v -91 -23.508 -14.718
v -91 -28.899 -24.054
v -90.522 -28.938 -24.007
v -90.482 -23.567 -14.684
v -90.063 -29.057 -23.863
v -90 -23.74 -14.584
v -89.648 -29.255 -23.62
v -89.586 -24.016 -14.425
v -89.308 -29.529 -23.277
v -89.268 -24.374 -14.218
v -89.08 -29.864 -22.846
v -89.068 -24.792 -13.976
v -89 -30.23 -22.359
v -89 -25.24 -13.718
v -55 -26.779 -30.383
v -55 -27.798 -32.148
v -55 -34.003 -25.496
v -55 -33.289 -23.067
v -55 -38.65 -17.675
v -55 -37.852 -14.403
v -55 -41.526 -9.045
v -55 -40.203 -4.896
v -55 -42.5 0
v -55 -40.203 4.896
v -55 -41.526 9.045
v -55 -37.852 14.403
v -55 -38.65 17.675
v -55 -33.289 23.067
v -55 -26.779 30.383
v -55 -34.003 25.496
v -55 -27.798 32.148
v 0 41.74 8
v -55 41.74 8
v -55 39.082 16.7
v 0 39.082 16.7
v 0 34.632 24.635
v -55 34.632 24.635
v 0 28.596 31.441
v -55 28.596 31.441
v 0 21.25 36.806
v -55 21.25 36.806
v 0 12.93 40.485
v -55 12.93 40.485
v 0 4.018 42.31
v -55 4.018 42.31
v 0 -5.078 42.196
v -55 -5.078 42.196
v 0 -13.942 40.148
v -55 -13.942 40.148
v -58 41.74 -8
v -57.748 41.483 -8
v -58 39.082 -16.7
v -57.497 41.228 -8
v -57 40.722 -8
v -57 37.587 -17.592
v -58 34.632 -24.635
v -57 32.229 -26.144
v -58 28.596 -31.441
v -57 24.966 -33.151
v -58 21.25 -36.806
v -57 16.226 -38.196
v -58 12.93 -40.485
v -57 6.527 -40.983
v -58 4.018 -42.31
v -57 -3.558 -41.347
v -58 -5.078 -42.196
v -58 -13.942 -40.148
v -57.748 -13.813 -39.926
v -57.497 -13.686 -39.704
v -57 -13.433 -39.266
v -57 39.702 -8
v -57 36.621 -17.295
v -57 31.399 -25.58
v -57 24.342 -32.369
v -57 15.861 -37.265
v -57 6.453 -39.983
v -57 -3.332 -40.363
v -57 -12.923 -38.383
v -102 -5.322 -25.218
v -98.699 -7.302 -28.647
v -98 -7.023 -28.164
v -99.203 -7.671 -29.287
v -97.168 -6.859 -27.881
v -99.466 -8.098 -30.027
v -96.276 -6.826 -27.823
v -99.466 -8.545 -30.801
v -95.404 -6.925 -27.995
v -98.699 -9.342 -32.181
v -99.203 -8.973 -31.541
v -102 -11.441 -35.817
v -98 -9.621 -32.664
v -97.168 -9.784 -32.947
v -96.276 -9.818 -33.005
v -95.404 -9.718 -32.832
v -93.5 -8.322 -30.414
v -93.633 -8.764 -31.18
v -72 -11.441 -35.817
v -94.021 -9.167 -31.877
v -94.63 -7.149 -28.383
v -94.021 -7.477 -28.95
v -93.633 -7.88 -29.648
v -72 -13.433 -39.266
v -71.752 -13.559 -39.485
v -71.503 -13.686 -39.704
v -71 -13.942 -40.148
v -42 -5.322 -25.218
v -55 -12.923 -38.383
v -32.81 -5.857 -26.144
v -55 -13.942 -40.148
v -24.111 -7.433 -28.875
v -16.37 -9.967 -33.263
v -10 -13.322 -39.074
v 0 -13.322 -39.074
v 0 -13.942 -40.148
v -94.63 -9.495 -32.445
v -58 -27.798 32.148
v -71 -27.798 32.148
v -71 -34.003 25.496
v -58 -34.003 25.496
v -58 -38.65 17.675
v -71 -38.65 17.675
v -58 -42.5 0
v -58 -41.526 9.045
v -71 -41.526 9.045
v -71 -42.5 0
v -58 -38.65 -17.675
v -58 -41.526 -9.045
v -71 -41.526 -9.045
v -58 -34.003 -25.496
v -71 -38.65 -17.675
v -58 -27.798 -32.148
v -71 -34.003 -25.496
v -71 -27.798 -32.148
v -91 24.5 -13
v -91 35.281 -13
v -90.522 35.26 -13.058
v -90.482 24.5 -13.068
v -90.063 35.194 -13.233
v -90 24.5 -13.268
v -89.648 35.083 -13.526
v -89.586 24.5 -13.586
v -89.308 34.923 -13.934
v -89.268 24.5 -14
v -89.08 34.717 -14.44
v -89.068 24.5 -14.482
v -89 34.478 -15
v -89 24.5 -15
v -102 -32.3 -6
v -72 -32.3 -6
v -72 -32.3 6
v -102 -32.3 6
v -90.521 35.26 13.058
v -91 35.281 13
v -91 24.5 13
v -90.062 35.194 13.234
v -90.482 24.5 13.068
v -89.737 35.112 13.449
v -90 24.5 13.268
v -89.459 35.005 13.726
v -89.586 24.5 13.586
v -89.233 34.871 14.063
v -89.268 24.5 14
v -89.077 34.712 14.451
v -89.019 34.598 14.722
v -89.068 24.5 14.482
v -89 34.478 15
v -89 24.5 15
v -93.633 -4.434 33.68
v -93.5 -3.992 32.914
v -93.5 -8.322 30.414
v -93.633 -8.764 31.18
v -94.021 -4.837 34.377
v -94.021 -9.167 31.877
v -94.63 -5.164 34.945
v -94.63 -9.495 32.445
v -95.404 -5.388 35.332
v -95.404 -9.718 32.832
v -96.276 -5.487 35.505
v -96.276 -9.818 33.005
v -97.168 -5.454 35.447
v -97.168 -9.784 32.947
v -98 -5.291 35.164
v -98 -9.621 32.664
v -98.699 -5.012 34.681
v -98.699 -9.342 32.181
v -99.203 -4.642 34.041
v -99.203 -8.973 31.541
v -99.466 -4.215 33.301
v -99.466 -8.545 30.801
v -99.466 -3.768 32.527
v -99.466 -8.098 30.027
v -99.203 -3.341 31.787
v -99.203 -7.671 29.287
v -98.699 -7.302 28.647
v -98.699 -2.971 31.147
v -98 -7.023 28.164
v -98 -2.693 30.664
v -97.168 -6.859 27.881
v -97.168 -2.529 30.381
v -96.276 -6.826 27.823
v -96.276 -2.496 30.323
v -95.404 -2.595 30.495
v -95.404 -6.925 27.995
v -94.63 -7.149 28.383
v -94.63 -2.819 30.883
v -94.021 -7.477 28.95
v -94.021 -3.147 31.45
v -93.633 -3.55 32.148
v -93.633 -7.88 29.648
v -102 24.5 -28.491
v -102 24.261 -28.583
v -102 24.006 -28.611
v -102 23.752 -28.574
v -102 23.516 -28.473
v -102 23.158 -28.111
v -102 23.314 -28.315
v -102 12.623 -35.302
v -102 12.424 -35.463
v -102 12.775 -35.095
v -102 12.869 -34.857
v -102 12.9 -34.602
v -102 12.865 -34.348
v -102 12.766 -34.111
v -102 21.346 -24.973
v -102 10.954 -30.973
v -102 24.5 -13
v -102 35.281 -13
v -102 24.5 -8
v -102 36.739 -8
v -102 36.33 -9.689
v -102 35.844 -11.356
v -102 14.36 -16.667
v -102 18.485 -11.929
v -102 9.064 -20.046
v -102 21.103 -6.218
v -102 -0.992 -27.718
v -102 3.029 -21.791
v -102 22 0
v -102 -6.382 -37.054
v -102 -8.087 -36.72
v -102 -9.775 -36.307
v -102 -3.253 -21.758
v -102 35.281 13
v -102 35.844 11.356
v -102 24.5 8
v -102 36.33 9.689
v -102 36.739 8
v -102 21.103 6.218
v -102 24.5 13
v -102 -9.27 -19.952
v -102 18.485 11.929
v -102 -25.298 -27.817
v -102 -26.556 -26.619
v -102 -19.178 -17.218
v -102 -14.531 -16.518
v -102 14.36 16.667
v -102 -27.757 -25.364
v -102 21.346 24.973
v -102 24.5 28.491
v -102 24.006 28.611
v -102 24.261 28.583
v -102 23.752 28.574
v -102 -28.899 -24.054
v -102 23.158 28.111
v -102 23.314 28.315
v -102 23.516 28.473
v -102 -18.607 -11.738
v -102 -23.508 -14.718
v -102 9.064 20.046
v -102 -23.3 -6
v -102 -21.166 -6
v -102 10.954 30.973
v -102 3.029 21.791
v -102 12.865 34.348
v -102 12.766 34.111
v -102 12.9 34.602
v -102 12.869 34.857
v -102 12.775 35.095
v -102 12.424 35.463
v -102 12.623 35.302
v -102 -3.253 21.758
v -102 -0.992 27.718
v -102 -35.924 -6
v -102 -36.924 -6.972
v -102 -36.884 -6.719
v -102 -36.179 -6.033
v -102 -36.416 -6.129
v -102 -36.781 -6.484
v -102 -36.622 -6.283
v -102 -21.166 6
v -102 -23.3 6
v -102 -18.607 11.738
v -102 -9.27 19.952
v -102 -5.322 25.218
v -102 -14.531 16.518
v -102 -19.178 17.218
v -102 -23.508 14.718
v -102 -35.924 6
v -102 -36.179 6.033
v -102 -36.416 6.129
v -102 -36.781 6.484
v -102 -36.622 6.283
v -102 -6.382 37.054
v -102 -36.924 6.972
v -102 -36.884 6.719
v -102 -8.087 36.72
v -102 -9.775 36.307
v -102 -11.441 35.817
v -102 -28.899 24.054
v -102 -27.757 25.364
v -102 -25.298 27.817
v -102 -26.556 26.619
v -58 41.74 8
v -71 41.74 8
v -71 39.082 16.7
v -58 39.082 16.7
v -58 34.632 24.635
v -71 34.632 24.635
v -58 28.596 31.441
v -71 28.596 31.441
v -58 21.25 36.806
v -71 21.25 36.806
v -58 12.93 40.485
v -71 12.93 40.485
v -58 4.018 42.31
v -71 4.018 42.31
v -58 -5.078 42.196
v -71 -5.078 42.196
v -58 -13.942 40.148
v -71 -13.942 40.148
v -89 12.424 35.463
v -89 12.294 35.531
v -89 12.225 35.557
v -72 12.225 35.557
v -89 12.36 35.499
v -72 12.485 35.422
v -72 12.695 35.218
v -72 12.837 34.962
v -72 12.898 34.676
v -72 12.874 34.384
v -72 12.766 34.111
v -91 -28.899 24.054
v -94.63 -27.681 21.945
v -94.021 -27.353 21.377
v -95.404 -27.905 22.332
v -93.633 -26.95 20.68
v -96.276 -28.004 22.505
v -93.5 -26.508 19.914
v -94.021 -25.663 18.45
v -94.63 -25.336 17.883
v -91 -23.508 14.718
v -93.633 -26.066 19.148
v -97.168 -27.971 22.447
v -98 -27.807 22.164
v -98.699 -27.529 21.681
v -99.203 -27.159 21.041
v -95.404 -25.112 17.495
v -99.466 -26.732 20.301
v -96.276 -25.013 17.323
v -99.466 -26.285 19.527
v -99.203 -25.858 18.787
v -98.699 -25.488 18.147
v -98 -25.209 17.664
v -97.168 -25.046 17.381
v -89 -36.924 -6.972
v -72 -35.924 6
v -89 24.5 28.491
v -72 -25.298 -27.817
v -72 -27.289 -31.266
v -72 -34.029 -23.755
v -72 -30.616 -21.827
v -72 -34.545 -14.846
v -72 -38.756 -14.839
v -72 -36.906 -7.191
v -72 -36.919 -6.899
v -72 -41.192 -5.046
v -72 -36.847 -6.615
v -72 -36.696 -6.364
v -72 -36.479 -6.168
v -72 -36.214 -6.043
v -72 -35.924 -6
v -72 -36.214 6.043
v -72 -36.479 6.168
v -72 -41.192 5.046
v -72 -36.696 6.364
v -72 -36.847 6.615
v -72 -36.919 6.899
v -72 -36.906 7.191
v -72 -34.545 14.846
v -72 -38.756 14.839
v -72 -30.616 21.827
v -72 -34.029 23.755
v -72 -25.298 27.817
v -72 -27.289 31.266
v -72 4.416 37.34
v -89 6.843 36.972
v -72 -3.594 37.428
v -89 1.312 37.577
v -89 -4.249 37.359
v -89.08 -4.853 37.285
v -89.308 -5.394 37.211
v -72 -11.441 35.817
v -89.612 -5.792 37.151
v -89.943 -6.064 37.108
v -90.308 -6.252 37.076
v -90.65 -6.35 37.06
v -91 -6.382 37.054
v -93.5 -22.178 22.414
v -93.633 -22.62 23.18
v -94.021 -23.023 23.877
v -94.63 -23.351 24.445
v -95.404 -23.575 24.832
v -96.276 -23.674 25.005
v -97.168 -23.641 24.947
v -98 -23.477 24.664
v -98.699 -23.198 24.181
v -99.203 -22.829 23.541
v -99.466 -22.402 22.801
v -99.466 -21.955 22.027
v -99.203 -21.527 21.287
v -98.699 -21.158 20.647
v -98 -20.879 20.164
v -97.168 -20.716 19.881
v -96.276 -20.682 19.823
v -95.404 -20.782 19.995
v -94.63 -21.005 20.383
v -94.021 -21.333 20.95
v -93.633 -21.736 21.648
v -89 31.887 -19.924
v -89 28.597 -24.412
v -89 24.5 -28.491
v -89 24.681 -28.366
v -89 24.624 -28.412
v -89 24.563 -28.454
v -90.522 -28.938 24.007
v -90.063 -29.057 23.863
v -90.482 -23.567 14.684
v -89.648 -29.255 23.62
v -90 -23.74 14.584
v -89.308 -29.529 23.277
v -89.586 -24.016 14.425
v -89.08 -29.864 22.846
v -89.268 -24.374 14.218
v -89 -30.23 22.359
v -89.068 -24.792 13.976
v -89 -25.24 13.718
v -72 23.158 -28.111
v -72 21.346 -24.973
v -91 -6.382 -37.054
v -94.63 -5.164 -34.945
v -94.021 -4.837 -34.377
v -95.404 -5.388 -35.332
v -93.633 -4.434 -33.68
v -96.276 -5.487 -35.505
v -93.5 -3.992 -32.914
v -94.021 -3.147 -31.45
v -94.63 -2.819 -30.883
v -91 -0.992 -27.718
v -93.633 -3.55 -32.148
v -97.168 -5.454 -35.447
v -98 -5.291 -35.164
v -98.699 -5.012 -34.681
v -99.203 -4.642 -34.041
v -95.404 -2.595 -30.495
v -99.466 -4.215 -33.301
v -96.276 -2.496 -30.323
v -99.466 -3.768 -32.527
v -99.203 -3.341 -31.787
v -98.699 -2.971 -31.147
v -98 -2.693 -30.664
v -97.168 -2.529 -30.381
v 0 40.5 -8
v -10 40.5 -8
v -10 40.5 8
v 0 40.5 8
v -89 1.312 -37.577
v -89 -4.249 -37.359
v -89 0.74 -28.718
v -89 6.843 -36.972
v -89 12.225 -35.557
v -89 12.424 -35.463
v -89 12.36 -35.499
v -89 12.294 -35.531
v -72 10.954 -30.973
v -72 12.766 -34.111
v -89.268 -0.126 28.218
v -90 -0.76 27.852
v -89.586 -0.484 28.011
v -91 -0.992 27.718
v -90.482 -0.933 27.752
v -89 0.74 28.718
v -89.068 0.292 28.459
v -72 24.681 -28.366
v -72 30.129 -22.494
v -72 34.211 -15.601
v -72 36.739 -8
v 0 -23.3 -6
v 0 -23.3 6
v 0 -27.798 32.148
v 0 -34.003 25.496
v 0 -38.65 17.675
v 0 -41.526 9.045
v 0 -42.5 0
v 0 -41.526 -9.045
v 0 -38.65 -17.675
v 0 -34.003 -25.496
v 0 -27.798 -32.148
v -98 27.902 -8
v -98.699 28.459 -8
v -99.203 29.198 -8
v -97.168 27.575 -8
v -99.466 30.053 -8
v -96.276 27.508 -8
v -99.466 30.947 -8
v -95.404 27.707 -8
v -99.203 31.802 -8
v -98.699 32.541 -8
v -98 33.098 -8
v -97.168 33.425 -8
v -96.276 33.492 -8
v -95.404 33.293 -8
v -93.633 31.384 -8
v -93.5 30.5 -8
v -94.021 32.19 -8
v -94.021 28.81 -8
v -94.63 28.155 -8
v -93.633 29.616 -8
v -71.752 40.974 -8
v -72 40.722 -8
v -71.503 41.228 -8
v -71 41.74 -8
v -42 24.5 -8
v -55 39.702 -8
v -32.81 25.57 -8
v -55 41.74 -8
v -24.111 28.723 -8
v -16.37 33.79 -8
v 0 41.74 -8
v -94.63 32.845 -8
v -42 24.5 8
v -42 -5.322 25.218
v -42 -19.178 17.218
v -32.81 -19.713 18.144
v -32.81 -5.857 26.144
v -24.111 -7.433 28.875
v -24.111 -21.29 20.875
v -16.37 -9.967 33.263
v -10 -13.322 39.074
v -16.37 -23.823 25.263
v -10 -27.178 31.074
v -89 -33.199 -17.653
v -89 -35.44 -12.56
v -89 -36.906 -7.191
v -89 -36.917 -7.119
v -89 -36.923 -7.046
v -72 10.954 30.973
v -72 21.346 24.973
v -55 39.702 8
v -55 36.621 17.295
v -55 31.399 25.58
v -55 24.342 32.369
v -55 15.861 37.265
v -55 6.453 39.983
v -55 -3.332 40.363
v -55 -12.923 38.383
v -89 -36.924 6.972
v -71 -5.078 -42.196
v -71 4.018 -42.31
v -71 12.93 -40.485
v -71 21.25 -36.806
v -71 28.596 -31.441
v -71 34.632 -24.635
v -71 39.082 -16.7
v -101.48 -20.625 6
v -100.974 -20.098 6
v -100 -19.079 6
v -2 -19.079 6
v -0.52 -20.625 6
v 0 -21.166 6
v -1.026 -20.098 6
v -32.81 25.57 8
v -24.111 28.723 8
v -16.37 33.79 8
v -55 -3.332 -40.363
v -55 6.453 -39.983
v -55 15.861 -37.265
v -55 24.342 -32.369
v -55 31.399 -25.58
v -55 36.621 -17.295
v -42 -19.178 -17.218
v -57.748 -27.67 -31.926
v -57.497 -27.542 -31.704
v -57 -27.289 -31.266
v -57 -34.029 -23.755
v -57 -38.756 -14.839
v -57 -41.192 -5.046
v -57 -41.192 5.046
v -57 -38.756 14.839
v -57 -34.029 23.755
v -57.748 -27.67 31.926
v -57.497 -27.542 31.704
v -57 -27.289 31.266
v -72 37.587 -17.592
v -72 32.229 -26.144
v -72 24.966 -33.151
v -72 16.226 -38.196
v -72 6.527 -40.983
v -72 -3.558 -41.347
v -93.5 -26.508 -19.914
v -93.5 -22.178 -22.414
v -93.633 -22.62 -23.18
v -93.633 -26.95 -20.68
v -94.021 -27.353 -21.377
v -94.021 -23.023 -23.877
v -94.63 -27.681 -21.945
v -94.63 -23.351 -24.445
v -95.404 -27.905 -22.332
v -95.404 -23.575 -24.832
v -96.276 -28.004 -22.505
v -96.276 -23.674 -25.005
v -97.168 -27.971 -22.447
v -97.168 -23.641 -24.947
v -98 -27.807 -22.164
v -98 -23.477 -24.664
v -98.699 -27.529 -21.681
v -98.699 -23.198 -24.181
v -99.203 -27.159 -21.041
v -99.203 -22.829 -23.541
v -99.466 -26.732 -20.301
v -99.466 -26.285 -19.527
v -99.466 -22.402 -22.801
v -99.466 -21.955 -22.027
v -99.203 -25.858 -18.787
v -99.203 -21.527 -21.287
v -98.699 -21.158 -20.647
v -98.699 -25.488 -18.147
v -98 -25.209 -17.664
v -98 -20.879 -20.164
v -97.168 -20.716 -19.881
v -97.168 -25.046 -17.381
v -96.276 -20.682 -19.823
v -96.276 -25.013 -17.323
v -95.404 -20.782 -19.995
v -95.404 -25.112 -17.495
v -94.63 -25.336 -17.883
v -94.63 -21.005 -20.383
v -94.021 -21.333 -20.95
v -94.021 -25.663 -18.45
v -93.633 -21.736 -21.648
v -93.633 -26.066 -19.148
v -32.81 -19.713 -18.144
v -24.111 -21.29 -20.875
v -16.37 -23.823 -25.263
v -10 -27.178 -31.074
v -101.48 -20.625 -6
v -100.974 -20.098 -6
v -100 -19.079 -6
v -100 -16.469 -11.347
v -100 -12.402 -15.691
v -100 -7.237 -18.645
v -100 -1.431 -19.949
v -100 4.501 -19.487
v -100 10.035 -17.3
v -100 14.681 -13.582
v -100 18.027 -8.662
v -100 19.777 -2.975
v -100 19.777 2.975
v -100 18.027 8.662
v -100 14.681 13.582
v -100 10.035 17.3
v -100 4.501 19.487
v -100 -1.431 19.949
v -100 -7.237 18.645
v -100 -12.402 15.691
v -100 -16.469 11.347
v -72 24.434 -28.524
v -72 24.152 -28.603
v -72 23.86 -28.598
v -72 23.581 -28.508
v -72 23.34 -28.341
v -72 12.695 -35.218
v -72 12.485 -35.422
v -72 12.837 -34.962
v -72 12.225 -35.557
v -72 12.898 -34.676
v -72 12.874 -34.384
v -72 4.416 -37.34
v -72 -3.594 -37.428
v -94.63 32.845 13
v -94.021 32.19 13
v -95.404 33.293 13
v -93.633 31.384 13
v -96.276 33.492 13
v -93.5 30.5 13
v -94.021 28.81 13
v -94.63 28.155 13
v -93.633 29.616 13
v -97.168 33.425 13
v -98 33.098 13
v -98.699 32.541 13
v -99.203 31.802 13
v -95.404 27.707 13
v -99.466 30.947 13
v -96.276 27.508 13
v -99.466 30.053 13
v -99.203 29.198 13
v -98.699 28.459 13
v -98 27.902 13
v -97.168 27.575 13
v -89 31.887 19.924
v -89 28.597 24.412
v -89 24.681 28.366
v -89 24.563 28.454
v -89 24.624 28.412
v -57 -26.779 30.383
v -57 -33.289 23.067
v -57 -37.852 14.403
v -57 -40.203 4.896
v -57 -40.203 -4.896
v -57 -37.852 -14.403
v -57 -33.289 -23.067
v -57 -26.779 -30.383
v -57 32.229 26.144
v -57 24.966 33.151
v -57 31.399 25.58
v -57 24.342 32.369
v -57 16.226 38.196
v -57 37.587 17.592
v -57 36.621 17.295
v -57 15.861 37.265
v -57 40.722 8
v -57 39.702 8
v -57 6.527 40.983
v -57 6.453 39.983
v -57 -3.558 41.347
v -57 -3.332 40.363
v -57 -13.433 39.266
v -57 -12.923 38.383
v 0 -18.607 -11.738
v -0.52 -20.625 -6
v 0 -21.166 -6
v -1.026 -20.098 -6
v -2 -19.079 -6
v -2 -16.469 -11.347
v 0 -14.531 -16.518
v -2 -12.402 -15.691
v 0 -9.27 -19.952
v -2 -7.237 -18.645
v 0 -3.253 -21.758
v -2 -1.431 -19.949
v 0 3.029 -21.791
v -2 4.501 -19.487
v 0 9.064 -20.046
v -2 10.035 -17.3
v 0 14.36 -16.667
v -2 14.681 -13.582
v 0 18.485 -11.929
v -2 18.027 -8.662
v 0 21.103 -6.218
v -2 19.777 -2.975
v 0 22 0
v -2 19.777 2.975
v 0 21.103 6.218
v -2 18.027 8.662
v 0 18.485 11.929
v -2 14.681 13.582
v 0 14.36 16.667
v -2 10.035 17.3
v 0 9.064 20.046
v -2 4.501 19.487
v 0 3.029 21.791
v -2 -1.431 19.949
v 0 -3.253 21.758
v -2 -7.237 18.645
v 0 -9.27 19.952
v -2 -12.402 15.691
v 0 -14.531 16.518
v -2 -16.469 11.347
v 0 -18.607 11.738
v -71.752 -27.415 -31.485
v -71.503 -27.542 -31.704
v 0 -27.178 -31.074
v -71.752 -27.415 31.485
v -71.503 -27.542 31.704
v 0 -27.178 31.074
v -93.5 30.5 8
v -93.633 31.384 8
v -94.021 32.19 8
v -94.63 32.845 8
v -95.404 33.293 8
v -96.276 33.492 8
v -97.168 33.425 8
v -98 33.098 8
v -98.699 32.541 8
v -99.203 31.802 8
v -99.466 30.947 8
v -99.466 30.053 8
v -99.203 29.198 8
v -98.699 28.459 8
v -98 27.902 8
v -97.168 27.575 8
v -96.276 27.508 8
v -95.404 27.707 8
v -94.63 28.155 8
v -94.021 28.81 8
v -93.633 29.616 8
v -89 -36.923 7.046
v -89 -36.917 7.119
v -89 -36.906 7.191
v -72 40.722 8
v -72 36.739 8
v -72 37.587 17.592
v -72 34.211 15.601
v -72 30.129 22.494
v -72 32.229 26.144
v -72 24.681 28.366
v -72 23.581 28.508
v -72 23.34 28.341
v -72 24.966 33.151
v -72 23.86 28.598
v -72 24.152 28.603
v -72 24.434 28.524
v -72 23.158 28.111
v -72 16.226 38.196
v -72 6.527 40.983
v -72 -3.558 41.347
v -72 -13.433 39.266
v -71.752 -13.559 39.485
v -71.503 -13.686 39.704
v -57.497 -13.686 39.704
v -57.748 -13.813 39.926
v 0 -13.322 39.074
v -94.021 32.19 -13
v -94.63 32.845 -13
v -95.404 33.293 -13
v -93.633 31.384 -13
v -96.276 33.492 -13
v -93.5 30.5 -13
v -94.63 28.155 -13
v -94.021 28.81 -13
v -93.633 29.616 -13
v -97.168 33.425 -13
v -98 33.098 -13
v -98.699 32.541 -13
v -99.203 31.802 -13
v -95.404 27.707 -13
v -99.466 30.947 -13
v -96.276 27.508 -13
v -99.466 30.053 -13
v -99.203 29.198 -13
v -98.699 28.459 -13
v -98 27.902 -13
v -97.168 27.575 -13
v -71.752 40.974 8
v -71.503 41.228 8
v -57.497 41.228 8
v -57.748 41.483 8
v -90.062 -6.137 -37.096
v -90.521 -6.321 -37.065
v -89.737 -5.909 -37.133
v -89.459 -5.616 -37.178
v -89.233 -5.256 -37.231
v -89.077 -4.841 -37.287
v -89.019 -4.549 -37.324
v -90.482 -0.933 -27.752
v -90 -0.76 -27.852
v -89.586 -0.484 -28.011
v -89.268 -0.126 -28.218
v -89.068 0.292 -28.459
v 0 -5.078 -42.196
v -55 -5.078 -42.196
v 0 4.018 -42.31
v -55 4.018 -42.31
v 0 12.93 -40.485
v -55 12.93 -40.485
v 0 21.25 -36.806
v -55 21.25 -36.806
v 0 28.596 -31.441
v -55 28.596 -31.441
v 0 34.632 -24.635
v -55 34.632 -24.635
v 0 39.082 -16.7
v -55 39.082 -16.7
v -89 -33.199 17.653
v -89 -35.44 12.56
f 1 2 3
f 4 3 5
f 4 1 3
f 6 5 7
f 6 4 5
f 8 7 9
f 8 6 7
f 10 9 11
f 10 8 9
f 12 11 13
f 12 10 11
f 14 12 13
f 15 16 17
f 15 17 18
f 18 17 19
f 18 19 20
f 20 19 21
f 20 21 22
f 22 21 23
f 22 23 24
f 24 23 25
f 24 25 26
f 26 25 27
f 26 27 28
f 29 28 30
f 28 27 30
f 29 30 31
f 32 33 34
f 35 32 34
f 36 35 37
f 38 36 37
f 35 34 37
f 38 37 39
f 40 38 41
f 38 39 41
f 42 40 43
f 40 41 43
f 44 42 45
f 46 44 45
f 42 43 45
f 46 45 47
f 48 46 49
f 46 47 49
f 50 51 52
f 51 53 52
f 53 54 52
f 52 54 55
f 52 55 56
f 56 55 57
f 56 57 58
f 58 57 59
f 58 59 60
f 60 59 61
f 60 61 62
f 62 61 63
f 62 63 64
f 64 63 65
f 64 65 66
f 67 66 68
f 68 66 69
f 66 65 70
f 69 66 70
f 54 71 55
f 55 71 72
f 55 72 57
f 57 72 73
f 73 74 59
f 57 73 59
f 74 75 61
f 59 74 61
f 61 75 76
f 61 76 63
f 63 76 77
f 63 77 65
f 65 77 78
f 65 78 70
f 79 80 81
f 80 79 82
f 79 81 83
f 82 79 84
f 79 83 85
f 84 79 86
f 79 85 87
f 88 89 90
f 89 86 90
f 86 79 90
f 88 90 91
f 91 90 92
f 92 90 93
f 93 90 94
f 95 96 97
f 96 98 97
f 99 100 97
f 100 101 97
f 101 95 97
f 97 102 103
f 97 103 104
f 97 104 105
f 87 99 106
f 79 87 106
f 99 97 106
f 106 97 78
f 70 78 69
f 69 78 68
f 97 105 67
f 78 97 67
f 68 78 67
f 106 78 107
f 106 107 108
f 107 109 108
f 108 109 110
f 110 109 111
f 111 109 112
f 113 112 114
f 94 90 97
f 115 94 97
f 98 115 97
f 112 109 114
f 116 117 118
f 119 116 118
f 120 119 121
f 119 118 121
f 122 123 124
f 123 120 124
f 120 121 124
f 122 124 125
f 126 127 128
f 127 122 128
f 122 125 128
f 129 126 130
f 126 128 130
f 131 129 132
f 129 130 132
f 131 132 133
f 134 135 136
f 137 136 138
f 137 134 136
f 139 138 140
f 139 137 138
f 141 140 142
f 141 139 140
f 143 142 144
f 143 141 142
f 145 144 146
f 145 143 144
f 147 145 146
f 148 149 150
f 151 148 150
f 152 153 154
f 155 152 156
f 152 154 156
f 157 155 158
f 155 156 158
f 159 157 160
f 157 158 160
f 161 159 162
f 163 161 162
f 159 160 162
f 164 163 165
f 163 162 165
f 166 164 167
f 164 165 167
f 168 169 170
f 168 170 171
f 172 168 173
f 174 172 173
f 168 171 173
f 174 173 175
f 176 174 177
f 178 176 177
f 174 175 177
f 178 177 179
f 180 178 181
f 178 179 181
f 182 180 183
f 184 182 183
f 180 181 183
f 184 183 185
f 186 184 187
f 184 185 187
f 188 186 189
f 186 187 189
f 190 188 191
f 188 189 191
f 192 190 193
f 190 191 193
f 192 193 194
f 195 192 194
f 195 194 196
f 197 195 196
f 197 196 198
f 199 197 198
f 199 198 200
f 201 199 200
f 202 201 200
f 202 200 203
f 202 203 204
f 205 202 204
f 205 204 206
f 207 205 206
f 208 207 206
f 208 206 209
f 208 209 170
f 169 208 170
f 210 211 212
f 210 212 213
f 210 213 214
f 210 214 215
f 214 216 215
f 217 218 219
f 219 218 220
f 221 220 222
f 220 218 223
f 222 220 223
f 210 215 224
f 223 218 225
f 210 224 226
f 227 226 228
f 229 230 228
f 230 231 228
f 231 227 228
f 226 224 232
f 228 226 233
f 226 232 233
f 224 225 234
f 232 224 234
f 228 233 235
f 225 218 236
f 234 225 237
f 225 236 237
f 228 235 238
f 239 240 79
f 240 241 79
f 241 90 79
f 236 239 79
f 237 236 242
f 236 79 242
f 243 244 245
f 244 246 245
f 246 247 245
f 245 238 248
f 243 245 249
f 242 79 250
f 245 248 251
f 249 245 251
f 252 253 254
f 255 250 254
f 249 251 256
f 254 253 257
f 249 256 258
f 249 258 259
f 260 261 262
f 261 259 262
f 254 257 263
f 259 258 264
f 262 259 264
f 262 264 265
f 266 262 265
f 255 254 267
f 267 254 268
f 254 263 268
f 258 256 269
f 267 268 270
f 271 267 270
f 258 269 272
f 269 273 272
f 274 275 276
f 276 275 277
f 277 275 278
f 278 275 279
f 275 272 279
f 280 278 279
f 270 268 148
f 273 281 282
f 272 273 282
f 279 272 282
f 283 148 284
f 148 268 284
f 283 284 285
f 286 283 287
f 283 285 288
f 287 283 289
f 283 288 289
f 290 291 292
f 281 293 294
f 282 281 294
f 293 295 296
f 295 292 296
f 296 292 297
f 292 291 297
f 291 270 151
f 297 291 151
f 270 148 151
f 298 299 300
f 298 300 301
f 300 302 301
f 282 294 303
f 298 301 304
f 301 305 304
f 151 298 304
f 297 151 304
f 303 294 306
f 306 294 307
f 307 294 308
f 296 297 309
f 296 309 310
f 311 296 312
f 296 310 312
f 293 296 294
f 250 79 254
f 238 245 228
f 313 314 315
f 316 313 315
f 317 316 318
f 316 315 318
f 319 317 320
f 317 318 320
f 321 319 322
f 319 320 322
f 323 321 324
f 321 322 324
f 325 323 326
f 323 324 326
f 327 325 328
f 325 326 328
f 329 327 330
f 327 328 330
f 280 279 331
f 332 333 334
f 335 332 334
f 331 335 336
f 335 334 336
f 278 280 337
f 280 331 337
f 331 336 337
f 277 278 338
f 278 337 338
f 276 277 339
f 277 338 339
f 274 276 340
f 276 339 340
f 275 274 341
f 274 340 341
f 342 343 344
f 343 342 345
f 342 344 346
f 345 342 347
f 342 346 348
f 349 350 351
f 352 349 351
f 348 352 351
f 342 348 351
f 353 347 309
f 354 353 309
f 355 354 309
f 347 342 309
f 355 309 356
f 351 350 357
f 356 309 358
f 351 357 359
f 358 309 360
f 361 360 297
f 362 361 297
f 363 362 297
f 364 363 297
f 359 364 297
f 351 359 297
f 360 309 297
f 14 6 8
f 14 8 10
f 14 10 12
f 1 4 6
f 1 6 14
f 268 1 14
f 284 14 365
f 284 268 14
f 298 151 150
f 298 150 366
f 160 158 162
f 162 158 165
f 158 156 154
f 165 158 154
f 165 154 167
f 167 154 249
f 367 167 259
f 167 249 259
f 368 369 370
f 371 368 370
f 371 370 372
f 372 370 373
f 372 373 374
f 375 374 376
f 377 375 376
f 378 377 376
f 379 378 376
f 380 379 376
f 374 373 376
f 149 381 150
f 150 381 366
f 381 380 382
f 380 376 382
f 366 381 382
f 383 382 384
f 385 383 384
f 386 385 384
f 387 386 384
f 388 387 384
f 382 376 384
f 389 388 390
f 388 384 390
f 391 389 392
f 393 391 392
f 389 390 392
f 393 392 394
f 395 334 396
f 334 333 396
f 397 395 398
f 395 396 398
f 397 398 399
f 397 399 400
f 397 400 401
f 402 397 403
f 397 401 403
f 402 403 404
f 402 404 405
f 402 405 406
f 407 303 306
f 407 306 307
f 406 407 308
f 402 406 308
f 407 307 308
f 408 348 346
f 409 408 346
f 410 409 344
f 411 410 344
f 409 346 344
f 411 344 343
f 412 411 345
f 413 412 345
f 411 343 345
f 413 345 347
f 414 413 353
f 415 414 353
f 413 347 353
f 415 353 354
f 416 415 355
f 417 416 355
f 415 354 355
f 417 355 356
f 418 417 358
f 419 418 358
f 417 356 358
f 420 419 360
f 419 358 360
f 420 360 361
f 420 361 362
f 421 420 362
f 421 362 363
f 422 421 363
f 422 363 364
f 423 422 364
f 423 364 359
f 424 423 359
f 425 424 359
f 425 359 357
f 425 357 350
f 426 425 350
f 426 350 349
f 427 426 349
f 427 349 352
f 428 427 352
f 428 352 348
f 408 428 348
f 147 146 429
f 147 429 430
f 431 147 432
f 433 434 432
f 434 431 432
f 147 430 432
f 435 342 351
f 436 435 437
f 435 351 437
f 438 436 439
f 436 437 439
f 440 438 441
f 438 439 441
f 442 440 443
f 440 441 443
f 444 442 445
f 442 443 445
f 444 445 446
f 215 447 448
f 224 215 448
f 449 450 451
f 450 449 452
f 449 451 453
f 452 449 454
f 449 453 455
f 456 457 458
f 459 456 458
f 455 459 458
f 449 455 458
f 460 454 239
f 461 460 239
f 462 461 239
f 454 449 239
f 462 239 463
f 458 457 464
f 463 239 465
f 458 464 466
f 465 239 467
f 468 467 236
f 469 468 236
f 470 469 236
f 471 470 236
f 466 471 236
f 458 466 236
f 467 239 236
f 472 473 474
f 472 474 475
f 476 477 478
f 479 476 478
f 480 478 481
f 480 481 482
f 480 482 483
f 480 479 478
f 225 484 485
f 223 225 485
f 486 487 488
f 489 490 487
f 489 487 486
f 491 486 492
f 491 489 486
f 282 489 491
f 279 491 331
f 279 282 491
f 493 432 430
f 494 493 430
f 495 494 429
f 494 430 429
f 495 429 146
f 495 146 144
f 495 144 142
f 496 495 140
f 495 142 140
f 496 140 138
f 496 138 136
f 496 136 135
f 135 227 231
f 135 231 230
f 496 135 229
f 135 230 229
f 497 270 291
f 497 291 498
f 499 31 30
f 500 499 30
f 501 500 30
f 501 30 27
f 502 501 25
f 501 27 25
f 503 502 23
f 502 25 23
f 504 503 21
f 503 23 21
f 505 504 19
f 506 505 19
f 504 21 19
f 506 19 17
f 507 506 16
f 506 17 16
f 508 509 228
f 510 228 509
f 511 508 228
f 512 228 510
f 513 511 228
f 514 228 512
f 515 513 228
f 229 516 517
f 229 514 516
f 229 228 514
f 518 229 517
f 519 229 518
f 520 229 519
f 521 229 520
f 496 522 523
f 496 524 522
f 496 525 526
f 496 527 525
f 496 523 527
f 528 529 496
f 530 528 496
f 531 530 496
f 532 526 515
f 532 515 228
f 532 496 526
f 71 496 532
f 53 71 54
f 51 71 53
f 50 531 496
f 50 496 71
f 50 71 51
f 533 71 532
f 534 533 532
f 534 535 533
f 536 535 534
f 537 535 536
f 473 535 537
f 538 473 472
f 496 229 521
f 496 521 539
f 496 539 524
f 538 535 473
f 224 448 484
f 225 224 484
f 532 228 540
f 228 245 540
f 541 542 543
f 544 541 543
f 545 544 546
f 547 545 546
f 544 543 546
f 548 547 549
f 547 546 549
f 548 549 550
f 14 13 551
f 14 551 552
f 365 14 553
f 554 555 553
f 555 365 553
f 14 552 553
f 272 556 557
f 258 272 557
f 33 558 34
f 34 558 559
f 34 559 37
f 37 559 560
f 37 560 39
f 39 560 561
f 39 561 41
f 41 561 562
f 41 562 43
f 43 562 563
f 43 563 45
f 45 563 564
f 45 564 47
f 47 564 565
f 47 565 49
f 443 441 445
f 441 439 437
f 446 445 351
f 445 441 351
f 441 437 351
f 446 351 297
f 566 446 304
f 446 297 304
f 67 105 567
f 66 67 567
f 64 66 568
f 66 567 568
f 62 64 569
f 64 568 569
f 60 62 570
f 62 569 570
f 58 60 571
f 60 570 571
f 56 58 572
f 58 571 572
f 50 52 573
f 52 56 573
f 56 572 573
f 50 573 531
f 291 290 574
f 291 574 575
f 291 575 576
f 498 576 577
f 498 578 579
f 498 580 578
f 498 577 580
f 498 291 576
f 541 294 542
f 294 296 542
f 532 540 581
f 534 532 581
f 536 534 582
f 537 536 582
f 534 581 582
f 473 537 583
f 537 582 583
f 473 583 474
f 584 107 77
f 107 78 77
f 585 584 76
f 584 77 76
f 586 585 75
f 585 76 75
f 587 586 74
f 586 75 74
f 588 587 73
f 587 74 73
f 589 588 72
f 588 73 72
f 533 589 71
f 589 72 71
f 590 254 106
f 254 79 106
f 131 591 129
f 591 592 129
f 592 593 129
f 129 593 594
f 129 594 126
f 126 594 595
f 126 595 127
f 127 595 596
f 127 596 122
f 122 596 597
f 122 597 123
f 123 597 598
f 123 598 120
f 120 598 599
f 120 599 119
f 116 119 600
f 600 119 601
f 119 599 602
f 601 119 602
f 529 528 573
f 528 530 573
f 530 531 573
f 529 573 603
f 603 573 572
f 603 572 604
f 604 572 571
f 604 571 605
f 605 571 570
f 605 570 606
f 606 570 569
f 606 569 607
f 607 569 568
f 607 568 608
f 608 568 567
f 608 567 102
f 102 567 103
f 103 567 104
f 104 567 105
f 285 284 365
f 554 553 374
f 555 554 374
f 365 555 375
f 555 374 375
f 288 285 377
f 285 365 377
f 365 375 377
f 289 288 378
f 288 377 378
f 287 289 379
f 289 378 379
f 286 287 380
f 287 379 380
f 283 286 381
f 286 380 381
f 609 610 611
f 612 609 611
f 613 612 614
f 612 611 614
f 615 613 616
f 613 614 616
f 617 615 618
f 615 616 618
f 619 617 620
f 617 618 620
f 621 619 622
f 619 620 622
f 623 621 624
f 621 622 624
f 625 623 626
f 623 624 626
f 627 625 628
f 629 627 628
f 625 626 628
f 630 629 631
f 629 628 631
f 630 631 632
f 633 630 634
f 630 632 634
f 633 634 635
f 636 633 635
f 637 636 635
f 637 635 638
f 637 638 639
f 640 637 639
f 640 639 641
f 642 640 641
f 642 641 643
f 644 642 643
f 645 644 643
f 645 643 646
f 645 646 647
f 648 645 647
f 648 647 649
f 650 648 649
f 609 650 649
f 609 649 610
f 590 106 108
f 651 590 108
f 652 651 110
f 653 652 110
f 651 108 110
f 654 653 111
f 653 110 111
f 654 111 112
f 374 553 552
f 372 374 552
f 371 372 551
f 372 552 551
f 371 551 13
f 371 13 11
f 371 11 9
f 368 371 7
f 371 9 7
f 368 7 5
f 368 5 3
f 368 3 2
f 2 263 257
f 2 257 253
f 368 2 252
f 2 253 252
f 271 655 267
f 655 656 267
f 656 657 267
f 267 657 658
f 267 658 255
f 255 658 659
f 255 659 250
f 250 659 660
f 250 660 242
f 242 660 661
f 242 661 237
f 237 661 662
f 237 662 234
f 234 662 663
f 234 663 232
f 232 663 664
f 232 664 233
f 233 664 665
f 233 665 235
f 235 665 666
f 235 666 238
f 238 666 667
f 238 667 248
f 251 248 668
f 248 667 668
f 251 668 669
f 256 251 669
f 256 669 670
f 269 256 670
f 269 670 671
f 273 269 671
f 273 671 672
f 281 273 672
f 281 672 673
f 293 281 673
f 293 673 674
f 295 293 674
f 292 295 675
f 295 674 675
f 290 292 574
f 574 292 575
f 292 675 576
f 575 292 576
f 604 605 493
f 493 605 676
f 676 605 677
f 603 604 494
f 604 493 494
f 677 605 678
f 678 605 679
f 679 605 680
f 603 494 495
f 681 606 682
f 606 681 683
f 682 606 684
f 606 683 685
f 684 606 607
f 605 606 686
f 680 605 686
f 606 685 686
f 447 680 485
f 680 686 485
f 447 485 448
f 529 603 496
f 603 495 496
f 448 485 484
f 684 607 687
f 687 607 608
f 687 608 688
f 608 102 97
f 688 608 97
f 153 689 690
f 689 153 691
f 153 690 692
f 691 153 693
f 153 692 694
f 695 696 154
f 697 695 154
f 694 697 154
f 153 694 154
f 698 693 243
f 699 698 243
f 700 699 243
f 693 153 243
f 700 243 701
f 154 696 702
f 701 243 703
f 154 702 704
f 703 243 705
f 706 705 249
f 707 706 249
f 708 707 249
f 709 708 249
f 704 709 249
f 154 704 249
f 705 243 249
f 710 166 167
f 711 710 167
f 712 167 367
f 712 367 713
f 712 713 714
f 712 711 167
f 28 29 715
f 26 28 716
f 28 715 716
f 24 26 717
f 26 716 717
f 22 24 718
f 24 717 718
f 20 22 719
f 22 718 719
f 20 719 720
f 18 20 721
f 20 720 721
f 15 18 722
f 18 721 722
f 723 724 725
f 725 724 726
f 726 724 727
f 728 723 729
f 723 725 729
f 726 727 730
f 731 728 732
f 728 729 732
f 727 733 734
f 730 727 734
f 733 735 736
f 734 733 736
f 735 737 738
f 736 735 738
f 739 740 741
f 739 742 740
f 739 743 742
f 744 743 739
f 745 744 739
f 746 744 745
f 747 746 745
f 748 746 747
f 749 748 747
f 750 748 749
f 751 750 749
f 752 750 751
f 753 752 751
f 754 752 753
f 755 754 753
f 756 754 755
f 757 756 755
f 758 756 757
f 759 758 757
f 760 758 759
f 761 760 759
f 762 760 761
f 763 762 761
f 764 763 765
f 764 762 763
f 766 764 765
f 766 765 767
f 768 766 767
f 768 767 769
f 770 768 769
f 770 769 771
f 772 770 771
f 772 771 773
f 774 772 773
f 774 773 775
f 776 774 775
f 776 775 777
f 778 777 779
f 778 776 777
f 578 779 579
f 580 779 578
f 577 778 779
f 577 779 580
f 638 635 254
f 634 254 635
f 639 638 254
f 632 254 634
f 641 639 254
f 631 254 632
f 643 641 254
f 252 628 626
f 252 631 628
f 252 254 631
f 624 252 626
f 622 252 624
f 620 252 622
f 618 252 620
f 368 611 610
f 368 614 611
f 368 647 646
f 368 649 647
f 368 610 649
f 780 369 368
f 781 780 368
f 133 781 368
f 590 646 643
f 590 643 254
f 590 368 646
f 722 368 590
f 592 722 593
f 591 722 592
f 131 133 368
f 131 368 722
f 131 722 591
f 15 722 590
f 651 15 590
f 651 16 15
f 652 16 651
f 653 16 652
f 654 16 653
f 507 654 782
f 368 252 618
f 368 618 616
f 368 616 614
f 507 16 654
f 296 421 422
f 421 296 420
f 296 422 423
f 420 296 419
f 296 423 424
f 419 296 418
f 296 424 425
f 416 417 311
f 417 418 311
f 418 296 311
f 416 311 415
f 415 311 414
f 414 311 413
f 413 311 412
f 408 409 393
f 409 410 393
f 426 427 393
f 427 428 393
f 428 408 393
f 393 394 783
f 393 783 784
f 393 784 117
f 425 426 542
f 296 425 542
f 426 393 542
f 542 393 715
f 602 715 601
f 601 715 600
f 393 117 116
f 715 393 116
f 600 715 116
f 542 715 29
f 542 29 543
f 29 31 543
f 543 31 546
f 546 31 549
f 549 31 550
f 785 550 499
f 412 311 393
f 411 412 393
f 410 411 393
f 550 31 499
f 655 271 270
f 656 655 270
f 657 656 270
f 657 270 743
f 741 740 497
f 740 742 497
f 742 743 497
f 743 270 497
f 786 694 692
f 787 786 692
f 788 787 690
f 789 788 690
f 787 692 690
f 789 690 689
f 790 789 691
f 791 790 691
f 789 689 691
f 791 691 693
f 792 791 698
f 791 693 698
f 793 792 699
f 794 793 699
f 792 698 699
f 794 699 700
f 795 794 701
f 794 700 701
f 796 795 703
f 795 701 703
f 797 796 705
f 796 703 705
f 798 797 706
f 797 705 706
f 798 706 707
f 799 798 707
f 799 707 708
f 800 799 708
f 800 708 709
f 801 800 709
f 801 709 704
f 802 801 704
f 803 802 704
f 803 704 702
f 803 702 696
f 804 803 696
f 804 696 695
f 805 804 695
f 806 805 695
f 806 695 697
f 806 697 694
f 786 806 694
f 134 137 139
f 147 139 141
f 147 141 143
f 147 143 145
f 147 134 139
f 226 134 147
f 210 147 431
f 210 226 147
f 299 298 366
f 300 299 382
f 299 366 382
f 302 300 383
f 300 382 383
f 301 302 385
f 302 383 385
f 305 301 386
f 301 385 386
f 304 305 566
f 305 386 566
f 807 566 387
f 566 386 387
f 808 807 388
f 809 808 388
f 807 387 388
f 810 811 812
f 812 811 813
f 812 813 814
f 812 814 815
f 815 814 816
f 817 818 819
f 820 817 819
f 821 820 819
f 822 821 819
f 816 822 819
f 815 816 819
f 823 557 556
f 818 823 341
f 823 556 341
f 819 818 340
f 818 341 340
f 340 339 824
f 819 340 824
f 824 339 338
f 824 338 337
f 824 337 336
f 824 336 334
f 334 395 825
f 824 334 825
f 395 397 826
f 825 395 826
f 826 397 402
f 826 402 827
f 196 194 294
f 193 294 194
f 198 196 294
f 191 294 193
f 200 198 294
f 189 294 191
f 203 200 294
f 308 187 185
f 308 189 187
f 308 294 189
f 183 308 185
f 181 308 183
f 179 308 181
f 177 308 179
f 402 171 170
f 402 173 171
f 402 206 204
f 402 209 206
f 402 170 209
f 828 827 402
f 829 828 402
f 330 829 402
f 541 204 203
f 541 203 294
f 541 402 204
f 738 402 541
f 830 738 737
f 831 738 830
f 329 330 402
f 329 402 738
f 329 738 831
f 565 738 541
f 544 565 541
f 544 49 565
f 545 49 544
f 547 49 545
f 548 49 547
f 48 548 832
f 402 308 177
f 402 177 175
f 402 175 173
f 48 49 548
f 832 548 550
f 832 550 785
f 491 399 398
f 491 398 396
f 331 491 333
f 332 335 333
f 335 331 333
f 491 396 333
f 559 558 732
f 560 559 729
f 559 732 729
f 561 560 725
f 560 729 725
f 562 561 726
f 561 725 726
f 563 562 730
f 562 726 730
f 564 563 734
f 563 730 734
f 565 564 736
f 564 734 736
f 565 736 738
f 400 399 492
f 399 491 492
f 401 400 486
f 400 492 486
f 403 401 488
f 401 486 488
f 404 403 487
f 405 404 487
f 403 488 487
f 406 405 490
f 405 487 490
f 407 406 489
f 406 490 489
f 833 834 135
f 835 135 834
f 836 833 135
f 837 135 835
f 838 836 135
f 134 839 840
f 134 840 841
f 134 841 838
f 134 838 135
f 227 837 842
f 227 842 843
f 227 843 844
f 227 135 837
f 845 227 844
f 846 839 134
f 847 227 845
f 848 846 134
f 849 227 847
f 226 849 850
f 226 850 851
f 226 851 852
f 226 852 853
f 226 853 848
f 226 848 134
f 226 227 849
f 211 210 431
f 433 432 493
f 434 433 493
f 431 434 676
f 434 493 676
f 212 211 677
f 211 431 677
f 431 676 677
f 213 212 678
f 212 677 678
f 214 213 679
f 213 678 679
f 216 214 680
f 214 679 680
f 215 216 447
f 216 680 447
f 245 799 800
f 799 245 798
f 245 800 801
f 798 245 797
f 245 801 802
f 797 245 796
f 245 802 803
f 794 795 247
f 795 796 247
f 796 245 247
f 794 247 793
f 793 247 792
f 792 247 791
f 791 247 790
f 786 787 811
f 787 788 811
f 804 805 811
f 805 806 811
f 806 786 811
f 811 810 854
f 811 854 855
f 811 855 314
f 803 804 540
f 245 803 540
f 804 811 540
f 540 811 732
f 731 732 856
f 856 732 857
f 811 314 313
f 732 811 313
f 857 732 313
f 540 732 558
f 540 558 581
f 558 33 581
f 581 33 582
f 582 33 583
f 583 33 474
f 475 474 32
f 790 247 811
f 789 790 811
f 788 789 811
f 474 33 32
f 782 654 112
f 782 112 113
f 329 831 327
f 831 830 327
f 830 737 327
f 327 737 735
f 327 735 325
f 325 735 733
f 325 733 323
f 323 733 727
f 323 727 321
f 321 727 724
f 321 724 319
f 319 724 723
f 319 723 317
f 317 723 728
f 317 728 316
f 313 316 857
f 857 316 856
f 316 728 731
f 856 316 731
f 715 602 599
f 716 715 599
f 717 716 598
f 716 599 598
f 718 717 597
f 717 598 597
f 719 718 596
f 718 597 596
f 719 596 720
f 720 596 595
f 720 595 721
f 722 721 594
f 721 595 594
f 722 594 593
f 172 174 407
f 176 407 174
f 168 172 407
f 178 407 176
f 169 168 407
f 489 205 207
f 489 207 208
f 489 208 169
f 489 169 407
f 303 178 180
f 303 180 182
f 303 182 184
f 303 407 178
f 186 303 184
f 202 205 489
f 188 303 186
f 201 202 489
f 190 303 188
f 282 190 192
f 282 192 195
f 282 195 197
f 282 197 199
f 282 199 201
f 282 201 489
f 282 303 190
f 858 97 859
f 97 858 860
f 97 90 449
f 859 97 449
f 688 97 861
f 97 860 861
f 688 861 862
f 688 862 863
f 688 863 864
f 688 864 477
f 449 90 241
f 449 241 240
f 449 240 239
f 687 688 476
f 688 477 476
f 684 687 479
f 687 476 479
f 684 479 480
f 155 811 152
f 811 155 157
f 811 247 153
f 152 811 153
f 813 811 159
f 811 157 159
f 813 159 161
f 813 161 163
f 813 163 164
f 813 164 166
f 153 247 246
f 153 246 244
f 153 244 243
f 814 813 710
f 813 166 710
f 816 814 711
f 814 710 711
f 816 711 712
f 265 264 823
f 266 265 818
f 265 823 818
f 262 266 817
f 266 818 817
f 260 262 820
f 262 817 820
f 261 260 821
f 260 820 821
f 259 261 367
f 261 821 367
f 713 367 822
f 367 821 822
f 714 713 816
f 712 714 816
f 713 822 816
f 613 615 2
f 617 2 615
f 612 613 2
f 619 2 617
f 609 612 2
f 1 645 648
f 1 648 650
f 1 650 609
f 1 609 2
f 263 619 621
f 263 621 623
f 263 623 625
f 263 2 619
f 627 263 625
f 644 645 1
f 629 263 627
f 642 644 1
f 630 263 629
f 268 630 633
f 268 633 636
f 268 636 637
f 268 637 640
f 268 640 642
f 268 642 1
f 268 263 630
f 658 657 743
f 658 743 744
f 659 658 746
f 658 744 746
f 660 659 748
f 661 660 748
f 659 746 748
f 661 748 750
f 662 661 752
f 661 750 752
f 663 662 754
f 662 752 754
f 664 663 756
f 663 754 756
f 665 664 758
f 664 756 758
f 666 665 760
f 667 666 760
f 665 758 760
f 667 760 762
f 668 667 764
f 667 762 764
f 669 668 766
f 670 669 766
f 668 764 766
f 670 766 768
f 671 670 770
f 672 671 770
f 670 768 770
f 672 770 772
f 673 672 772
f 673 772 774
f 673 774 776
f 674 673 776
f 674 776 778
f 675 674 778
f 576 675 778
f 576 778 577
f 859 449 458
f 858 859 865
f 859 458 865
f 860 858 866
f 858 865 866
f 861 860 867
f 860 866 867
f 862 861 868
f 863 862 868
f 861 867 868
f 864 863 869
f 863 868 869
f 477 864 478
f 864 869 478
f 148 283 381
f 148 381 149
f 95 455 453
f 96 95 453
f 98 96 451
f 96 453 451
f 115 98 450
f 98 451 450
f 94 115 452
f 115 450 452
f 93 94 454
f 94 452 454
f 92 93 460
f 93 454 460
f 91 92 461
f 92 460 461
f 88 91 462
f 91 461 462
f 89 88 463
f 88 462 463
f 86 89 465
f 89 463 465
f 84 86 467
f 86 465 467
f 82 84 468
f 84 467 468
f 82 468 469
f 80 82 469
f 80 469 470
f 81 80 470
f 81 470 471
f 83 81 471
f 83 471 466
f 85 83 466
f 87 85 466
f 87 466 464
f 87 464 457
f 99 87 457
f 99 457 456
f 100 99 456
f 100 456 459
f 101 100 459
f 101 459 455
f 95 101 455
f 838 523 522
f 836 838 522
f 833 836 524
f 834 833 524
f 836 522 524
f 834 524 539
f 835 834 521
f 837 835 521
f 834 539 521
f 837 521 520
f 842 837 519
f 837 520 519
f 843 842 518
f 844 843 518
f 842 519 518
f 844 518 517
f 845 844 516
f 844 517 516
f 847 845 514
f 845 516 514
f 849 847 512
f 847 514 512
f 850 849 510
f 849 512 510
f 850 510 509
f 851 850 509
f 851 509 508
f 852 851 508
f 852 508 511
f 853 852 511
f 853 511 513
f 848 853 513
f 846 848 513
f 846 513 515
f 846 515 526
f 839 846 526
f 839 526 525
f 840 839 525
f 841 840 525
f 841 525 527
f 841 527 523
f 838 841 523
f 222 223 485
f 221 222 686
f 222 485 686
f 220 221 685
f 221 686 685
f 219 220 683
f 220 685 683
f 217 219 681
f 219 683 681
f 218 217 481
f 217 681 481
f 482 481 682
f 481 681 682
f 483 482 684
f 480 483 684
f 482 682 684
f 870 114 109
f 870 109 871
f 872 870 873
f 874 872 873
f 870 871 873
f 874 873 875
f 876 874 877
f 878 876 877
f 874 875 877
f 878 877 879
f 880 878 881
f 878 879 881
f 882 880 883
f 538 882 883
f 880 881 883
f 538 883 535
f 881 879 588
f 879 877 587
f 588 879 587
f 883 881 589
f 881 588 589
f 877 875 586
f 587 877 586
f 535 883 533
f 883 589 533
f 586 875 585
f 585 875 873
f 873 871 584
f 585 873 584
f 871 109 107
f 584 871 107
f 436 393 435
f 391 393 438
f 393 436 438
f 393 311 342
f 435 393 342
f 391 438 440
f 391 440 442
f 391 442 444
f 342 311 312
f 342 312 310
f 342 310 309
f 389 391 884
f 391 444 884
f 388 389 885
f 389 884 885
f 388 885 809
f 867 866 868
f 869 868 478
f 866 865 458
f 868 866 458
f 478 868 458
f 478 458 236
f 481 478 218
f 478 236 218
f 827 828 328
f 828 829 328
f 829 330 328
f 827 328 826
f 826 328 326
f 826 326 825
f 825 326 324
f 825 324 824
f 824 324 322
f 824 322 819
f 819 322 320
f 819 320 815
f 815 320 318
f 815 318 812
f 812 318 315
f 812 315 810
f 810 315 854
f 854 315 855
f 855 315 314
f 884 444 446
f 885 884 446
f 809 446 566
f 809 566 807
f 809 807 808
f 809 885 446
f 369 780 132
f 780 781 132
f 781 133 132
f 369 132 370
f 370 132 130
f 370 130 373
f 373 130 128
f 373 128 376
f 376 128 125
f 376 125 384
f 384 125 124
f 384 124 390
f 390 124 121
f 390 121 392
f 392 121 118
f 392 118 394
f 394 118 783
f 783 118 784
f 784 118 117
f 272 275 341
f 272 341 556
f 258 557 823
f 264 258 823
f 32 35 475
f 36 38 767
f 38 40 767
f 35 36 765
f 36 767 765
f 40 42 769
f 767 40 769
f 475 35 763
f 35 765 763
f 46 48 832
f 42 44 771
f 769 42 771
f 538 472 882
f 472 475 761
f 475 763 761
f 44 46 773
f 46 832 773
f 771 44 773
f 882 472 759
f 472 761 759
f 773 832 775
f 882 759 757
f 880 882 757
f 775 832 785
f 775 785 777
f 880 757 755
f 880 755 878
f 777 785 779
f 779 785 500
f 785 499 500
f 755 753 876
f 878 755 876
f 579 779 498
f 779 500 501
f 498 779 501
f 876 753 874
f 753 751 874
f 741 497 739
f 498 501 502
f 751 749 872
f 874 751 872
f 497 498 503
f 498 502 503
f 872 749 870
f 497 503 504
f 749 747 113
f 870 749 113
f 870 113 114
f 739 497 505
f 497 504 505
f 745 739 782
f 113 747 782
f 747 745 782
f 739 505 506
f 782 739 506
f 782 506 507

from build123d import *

# Parameters (mm, degrees)
CUT_EXTRUDE1_DEPTH       = 8
CIRPATTERN1_COUNT        = 3
CUT_EXTRUDE2_DEPTH       = 13
FILLET1_R                = 2
CUT_EXTRUDE3_REACH       = 125.655
SKETCH6_R                = 3
CIRPATTERN2_COUNT        = 3
FILLET1_OF_CIRPATTERN2_R = 2
CUT_EXTRUDE4_DEPTH       = 30
FILLET2_R                = 1
CIRPATTERN3_COUNT        = 3
FILLET2_OF_CIRPATTERN3_R = 1
CUT_EXTRUDE5_REACH       = 130.22
SKETCH9_W                = 102
SKETCH9_H                = 12
CHAMFER2_SIZE            = 2
CHAMFER3_SIZE            = 1


with BuildPart() as part:
    # Sketch1 → Revolve1 (revolve)
    with BuildSketch(Plane.XY, mode=Mode.PRIVATE) as revolve1_sk:
        Polygon((0, 20), (0, 42.5), (-55, 42.5), (-55, 40.5), (-57, 40.5), (-57, 42.5), (-72, 42.5), (-72, 37.6), (-102, 37.6), (-102, 20), align=None)
    revolve(revolve1_sk.sketch.rotate(Axis((-534.701035213, 0, 0), (1, 0, 0)), 90), axis=Axis((-534.701035213, 0, 0), (1, 0, 0)))

    # Sketch3 → Cut-Extrude1 (cut, symmetric)
    with BuildSketch(Plane.XY):
        with BuildLine():
            Line((-102, 24.5), (-42, 24.5))
            ThreePointArc((-42, 24.5), (-24.11145618, 28.72291236), (-10, 40.5))
            Line((-10, 40.5), (0, 40.5))
            Line((0, 40.5), (0, 42.5))
            Line((0, 42.5), (-55, 42.5))
            Line((-55, 42.5), (-55, 40.5))
            Line((-55, 40.5), (-57, 40.5))
            Line((-57, 40.5), (-57, 42.5))
            Line((-57, 42.5), (-72, 42.5))
            Line((-72, 42.5), (-72, 37.6))
            Line((-72, 37.6), (-102, 37.6))
            Line((-102, 37.6), (-102, 24.5))
        make_face()
    cut_extrude1 = extrude(amount=CUT_EXTRUDE1_DEPTH, both=True, mode=Mode.SUBTRACT)

    # CirPattern1: Cut-Extrude1 ×3 about axis
    cirpattern1_axis = Axis((0, 0, 0), (1, 0, 0))
    for i in range(1, CIRPATTERN1_COUNT):
        add(cut_extrude1.rotate(cirpattern1_axis, i * 360 / CIRPATTERN1_COUNT), mode=Mode.SUBTRACT)

    # Sketch4 → Cut-Extrude2 (cut)
    with BuildSketch(Plane.ZY.offset(102)):
        with BuildLine():
            Line((-13, 35.281156444), (-13, 24.5))
            Line((-13, 24.5), (-28.522096697, 24.5))
            ThreePointArc((-28.522096697, 24.5), (-21.449462979, 30.881718506), (-13, 35.281156444))
        make_face()
        with BuildLine():
            Line((13, 35.281156444), (13, 24.5))
            Line((13, 24.5), (28.522096697, 24.5))
            ThreePointArc((28.522096697, 24.5), (21.449462979, 30.881718506), (13, 35.281156444))
        make_face()
    cut_extrude2 = extrude(amount=-CUT_EXTRUDE2_DEPTH, mode=Mode.SUBTRACT)

    # Fillet1
    fillet1_edges = [part.edges().sort_by_distance(p)[0] for p in [
        (-89, 29.890578222, -13),
        (-89, 29.890578222, 13),
    ]]
    fillet(fillet1_edges, radius=FILLET1_R)

    # Cut-Extrude3: up to this face of the body (flat: up to its plane)
    cut_extrude3_end = Plane(part.part.faces().sort_by_distance((-96.5, 29.890578222, -13))[0])
    # Sketch6 → Cut-Extrude3 (cut, up to the picked face)
    with BuildSketch(Plane.XY.offset(13), mode=Mode.PRIVATE) as cut_extrude3_sk1:
        with Locations((-96.5, 30.5)):
            Circle(SKETCH6_R)
    cut_extrude3_tool1 = split(extrude(cut_extrude3_sk1.sketch, amount=-CUT_EXTRUDE3_REACH, mode=Mode.PRIVATE), bisect_by=cut_extrude3_end, keep=Keep.BOTH, mode=Mode.PRIVATE)
    cut_extrude3 = cut_extrude3_tool1.solids().sort_by(Axis((-96.5, 30.5, 13), (0, 0, -1)))[0]
    add(cut_extrude3, mode=Mode.SUBTRACT)

    # CirPattern2: Cut-Extrude2, Cut-Extrude3 ×3 about axis
    cirpattern2_axis = Axis((0, 0, 0), (1, 0, 0))
    add([cut_extrude2.rotate(cirpattern2_axis, i * 360 / CIRPATTERN2_COUNT) for i in range(1, CIRPATTERN2_COUNT)], mode=Mode.SUBTRACT)
    add([cut_extrude3.rotate(cirpattern2_axis, i * 360 / CIRPATTERN2_COUNT) for i in range(1, CIRPATTERN2_COUNT)], mode=Mode.SUBTRACT)

    # Fillet1 of CirPattern2
    fillet1_of_cirpattern2_edges = [part.edges().sort_by_distance(p)[0] for p in [
        (-89, -3.686958862, 32.386000074),
        (-89, -26.20361936, 19.386000074),
        (-89, -26.20361936, -19.386000074),
        (-89, -3.686958862, -32.386000074),
    ]]
    fillet(fillet1_of_cirpattern2_edges, radius=FILLET1_OF_CIRPATTERN2_R)

    # Sketch7 → Cut-Extrude4 (cut)
    with BuildSketch(Plane.ZY.offset(102)):
        with BuildLine():
            Line((-6, -37.118189611), (-6, -32.3))
            Line((-6, -32.3), (6, -32.3))
            Line((6, -32.3), (6, -37.118189611))
            ThreePointArc((6, -37.118189611), (0, -37.6), (-6, -37.118189611))
        make_face()
    cut_extrude4 = extrude(amount=-CUT_EXTRUDE4_DEPTH, mode=Mode.SUBTRACT)

    # Fillet2
    fillet2_edges = [part.edges().sort_by_distance(p)[0] for p in [
        (-87, -37.118189611, 6),
        (-87, -37.118189611, -6),
    ]]
    fillet(fillet2_edges, radius=FILLET2_R)

    # CirPattern3: Cut-Extrude4 ×3 about axis
    cirpattern3_axis = Axis((0, 0, 0), (1, 0, 0))
    for i in range(1, CIRPATTERN3_COUNT):
        add(cut_extrude4.rotate(cirpattern3_axis, i * 360 / CIRPATTERN3_COUNT), mode=Mode.SUBTRACT)

    # Fillet2 of CirPattern3
    fillet2_of_cirpattern3_edges = [part.edges().sort_by_distance(p)[0] for p in [
        (-87, 13.362942383, -35.145295146),
        (-87, 23.755247228, -29.145295146),
        (-87, 23.755247228, 29.145295146),
        (-87, 13.362942383, 35.145295146),
    ]]
    fillet(fillet2_of_cirpattern3_edges, radius=FILLET2_OF_CIRPATTERN3_R)

    # Sketch9 → Cut-Extrude5 (cut, up to next)
    with BuildSketch(Plane(origin=(0, -23.3, 0), x_dir=(1, 0, 0), z_dir=(0, 1, 0)), mode=Mode.PRIVATE) as cut_extrude5_sk1:
        with Locations((-51, 0)):
            Rectangle(SKETCH9_W, SKETCH9_H)
    cut_extrude5_tool1 = extrude(cut_extrude5_sk1.sketch, amount=CUT_EXTRUDE5_REACH, mode=Mode.PRIVATE) & part.part
    add(cut_extrude5_tool1.solids().sort_by_distance((-51, -23.3, 0))[0], mode=Mode.SUBTRACT)

    # Chamfer2
    chamfer2_edges = [part.edges().sort_by_distance(p)[0] for p in [
        (0, 20, 0),
        (-102, 20, 0),
    ]]
    chamfer(chamfer2_edges, length=CHAMFER2_SIZE)

    # Chamfer3
    chamfer3_edges = [part.edges().sort_by_distance(p)[0] for p in [
        (-72, -42.5, 0),
        (-72, 21.25, 36.806079661),
        (-57, -42.5, 0),
        (-57, 21.25, 36.806079661),
        (-72, 21.25, -36.806079661),
        (-57, 21.25, -36.806079661),
    ]]
    chamfer(chamfer3_edges, length=CHAMFER3_SIZE)


solid = part.part
